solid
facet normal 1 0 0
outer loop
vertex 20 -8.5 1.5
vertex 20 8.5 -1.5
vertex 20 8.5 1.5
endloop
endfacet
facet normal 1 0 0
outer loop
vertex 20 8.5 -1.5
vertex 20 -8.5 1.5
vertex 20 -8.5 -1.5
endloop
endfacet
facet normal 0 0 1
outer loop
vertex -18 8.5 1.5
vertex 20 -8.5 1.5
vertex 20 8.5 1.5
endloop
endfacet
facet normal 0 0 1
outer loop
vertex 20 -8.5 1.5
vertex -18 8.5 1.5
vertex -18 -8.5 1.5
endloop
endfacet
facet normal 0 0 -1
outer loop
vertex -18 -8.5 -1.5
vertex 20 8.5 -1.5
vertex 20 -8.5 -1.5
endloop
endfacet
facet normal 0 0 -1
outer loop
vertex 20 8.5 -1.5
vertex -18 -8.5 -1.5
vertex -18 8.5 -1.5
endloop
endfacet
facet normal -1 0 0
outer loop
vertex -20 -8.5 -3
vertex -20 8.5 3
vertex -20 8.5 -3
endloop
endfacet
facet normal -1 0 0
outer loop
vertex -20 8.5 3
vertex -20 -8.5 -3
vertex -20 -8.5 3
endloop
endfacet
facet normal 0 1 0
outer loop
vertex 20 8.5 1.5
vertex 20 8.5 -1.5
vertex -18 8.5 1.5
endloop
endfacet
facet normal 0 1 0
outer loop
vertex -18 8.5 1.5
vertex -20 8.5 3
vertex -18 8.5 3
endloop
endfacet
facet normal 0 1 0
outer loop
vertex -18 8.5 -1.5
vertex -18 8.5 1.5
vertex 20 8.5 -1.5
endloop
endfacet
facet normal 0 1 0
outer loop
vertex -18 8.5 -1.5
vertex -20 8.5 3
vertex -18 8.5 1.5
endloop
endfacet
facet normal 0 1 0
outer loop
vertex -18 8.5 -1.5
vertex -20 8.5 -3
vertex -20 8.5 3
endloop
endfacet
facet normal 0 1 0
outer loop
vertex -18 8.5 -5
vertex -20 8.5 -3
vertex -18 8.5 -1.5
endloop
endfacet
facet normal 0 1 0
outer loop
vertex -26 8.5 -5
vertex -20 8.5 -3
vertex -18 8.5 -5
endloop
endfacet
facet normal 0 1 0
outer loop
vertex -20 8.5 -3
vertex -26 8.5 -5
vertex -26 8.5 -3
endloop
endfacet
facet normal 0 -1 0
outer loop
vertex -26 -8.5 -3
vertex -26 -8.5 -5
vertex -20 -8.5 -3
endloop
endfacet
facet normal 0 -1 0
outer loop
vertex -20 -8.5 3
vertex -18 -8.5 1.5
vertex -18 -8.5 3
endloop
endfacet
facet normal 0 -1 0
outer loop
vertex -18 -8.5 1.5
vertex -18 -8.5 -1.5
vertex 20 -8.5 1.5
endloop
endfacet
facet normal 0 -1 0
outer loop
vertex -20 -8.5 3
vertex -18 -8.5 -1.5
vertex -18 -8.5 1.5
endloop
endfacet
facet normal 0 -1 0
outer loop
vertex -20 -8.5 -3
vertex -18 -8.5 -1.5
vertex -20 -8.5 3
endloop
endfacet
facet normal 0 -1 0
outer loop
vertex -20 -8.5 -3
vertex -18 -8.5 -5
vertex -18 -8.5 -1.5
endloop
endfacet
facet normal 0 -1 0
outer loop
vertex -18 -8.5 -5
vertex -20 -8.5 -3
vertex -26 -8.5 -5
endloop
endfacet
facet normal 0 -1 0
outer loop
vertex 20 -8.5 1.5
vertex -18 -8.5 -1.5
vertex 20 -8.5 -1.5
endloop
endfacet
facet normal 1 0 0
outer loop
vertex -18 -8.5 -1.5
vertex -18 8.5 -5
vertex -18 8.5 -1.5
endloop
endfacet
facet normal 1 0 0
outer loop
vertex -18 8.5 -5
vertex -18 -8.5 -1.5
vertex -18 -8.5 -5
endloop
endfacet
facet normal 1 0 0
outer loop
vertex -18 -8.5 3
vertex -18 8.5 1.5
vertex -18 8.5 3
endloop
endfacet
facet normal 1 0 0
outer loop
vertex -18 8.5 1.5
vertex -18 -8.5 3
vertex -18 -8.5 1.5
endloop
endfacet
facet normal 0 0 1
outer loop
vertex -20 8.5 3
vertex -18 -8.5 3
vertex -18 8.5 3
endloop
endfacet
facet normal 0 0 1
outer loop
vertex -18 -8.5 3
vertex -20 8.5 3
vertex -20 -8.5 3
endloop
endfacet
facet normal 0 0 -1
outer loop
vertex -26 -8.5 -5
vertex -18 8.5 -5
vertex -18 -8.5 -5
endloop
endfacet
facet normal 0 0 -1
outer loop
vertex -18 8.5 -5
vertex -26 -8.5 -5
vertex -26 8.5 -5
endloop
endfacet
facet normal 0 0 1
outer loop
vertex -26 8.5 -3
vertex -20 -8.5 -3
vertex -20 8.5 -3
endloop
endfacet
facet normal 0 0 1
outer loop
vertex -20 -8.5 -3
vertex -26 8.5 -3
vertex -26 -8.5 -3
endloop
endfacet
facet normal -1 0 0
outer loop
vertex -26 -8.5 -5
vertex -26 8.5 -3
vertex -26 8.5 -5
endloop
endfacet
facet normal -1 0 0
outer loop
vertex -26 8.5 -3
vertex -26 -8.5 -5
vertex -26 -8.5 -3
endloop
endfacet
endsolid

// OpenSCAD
boardLength = 40;
boardWidth = 17;
boardHeight = 3;

pins = 8;
pinsTop = 1.5;

hc05();

module hc05(){
	union(){
		cube([boardLength, boardWidth, boardHeight], center=true);
		translate([-boardLength/2+1,0,-1]) cube([2,boardWidth,pins], center=true);
		translate([-boardLength/2-pins/2+2,0,-pins+4]) cube([pins,boardWidth,2], center=true);
	}
}

module hc05_pinless(){	
	cube([boardLength, boardWidth, boardHeight], center=true);
}
